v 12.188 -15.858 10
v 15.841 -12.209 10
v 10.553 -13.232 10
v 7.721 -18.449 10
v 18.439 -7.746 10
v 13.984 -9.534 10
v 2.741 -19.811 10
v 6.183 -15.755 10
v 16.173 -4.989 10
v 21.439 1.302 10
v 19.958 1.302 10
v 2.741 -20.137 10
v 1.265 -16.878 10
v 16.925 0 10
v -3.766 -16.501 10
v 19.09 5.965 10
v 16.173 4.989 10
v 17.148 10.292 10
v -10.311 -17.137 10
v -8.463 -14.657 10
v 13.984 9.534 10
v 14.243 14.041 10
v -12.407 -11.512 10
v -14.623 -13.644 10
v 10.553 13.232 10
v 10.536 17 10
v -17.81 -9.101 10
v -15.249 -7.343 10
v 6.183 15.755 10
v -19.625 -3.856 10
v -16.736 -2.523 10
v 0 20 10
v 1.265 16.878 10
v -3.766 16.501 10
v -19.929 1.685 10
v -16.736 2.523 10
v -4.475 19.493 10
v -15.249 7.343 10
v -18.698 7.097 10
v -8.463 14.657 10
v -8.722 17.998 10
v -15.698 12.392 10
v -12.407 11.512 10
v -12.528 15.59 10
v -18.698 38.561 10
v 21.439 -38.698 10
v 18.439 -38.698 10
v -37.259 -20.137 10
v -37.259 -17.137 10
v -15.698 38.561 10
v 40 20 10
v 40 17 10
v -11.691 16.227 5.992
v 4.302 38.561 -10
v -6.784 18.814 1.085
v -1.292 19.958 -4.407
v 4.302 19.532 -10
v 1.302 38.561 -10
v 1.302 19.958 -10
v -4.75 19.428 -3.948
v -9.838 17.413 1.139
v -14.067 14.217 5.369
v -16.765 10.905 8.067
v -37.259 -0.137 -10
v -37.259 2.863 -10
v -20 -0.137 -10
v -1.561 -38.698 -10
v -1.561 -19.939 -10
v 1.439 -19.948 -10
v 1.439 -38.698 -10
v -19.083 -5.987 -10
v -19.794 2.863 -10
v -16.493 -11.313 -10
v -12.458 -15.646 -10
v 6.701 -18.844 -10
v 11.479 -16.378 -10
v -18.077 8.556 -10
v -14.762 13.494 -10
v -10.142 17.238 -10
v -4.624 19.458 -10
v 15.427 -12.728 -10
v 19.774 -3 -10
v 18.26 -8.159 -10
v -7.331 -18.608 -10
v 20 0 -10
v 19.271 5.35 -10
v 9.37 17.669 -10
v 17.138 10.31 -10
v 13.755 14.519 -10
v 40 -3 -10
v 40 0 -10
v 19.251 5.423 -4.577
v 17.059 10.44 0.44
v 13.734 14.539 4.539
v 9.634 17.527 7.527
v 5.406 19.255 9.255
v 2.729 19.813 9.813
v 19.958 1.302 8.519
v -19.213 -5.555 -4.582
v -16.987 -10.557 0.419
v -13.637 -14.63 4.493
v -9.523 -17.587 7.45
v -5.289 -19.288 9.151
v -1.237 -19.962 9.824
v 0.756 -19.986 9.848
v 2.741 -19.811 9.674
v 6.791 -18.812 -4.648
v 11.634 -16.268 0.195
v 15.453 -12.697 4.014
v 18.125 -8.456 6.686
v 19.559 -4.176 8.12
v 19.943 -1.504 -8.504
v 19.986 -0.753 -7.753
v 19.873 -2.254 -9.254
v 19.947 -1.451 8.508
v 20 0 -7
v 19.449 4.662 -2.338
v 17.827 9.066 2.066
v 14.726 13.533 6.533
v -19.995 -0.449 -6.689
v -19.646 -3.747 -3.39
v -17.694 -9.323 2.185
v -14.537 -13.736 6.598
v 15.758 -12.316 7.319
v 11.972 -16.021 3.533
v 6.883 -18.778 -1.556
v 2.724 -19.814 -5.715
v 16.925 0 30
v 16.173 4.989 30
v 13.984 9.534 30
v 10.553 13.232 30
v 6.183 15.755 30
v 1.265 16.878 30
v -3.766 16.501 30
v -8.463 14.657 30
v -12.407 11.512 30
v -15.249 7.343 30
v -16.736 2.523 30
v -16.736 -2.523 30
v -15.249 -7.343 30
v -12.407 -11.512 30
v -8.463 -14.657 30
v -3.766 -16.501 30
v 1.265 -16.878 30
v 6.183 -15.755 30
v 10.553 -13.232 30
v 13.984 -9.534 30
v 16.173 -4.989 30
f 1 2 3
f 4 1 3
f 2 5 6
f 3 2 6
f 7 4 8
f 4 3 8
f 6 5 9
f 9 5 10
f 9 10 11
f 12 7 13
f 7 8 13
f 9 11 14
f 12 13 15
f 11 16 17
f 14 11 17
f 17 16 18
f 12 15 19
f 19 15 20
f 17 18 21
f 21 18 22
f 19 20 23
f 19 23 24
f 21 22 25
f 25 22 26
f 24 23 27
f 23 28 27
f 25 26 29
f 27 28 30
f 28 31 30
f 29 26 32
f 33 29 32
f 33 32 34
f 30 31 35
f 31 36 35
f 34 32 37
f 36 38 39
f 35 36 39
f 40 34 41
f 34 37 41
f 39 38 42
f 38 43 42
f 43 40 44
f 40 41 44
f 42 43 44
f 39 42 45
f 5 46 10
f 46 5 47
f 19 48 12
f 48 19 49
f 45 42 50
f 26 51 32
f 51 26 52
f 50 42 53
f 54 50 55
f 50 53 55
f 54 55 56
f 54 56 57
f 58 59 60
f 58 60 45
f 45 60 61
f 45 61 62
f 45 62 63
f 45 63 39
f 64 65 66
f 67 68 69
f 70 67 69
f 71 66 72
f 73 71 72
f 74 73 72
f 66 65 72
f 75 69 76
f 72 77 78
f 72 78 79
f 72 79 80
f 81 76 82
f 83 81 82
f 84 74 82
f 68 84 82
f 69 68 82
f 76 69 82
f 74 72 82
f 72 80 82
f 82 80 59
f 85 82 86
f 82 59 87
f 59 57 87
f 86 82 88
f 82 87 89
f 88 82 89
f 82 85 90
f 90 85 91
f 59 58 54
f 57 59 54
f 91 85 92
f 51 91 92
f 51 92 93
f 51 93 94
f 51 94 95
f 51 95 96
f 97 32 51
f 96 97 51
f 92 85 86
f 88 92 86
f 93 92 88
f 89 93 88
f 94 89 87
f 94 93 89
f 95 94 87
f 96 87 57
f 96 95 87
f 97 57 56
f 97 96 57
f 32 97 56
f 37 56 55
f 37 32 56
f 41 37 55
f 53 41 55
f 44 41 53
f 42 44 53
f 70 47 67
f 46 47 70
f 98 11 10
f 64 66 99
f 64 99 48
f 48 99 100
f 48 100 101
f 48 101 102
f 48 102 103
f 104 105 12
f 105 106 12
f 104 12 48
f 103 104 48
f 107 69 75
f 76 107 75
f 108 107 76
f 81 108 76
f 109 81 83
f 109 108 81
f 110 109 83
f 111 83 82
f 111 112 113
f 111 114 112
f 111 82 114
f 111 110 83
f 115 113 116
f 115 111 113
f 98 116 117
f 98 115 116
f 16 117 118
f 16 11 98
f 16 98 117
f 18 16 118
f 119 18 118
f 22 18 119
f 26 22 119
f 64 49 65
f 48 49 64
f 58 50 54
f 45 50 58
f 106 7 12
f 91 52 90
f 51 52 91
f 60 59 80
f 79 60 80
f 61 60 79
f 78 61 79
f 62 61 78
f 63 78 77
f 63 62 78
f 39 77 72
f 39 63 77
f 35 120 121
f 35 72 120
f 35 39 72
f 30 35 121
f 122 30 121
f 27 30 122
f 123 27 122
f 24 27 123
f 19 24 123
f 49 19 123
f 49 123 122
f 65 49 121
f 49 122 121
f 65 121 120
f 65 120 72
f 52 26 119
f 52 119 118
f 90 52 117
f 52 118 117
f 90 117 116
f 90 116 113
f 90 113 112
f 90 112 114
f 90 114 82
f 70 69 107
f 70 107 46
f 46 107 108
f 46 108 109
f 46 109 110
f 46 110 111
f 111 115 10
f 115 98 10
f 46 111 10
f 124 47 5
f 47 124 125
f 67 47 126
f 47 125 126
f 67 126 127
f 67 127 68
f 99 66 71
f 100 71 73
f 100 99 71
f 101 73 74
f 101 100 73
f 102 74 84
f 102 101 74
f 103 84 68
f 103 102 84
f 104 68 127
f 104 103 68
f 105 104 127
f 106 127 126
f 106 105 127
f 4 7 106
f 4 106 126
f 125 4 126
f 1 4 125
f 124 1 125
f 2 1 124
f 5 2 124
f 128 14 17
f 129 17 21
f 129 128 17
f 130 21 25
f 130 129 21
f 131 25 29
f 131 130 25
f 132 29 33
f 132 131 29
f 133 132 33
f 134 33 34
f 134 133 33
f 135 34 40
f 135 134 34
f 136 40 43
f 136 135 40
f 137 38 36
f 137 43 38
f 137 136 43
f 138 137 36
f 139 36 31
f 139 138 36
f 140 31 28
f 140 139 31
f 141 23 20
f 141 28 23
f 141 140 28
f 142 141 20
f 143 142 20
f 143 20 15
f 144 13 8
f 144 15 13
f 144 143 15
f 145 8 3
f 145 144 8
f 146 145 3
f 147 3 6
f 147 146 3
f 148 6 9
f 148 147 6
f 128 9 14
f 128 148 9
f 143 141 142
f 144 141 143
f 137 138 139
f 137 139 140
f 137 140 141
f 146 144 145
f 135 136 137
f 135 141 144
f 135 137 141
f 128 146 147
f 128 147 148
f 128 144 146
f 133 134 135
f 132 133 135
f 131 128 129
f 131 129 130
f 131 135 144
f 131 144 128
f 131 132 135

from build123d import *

# Parameters (mm, degrees)
SKETCH1_R           = 20
SKETCH1_R_2         = 10
BOSS_EXTRUDE1_DEPTH = 10
SKETCH5_R           = 16.925
BOSS_EXTRUDE2_DEPTH = 20
BOSS_EXTRUDE3_DEPTH = 40
CIRPATTERN1_COUNT   = 4


with BuildPart() as part:
    # Sketch1 → Boss-Extrude1 (new, symmetric)
    with BuildSketch(Plane.XY):
        Circle(SKETCH1_R)
        Circle(SKETCH1_R_2, mode=Mode.SUBTRACT)
    extrude(amount=BOSS_EXTRUDE1_DEPTH, both=True)

    # Sketch5 → Boss-Extrude2 (add, symmetric)
    with BuildSketch(Plane.XY.offset(10)):
        Circle(SKETCH5_R)
    extrude(amount=BOSS_EXTRUDE2_DEPTH, both=True)

    # Sketch6 → Boss-Extrude3 (add)
    with BuildSketch(Plane(origin=(0, 0, 0), x_dir=(0, 0, -1), z_dir=(1, 0, 0))):
        Polygon((10, 0), (-10, 20), (-10, 17), (10, -3), align=None)
    boss_extrude3 = extrude(amount=BOSS_EXTRUDE3_DEPTH)

    # CirPattern1: Boss-Extrude3 ×4 about axis
    cirpattern1_axis = Axis((1.370302178, -0.068730139, 0), (0, 0, 1))
    for i in range(1, CIRPATTERN1_COUNT):
        add(boss_extrude3.rotate(cirpattern1_axis, i * 360 / CIRPATTERN1_COUNT))


solid = part.part
